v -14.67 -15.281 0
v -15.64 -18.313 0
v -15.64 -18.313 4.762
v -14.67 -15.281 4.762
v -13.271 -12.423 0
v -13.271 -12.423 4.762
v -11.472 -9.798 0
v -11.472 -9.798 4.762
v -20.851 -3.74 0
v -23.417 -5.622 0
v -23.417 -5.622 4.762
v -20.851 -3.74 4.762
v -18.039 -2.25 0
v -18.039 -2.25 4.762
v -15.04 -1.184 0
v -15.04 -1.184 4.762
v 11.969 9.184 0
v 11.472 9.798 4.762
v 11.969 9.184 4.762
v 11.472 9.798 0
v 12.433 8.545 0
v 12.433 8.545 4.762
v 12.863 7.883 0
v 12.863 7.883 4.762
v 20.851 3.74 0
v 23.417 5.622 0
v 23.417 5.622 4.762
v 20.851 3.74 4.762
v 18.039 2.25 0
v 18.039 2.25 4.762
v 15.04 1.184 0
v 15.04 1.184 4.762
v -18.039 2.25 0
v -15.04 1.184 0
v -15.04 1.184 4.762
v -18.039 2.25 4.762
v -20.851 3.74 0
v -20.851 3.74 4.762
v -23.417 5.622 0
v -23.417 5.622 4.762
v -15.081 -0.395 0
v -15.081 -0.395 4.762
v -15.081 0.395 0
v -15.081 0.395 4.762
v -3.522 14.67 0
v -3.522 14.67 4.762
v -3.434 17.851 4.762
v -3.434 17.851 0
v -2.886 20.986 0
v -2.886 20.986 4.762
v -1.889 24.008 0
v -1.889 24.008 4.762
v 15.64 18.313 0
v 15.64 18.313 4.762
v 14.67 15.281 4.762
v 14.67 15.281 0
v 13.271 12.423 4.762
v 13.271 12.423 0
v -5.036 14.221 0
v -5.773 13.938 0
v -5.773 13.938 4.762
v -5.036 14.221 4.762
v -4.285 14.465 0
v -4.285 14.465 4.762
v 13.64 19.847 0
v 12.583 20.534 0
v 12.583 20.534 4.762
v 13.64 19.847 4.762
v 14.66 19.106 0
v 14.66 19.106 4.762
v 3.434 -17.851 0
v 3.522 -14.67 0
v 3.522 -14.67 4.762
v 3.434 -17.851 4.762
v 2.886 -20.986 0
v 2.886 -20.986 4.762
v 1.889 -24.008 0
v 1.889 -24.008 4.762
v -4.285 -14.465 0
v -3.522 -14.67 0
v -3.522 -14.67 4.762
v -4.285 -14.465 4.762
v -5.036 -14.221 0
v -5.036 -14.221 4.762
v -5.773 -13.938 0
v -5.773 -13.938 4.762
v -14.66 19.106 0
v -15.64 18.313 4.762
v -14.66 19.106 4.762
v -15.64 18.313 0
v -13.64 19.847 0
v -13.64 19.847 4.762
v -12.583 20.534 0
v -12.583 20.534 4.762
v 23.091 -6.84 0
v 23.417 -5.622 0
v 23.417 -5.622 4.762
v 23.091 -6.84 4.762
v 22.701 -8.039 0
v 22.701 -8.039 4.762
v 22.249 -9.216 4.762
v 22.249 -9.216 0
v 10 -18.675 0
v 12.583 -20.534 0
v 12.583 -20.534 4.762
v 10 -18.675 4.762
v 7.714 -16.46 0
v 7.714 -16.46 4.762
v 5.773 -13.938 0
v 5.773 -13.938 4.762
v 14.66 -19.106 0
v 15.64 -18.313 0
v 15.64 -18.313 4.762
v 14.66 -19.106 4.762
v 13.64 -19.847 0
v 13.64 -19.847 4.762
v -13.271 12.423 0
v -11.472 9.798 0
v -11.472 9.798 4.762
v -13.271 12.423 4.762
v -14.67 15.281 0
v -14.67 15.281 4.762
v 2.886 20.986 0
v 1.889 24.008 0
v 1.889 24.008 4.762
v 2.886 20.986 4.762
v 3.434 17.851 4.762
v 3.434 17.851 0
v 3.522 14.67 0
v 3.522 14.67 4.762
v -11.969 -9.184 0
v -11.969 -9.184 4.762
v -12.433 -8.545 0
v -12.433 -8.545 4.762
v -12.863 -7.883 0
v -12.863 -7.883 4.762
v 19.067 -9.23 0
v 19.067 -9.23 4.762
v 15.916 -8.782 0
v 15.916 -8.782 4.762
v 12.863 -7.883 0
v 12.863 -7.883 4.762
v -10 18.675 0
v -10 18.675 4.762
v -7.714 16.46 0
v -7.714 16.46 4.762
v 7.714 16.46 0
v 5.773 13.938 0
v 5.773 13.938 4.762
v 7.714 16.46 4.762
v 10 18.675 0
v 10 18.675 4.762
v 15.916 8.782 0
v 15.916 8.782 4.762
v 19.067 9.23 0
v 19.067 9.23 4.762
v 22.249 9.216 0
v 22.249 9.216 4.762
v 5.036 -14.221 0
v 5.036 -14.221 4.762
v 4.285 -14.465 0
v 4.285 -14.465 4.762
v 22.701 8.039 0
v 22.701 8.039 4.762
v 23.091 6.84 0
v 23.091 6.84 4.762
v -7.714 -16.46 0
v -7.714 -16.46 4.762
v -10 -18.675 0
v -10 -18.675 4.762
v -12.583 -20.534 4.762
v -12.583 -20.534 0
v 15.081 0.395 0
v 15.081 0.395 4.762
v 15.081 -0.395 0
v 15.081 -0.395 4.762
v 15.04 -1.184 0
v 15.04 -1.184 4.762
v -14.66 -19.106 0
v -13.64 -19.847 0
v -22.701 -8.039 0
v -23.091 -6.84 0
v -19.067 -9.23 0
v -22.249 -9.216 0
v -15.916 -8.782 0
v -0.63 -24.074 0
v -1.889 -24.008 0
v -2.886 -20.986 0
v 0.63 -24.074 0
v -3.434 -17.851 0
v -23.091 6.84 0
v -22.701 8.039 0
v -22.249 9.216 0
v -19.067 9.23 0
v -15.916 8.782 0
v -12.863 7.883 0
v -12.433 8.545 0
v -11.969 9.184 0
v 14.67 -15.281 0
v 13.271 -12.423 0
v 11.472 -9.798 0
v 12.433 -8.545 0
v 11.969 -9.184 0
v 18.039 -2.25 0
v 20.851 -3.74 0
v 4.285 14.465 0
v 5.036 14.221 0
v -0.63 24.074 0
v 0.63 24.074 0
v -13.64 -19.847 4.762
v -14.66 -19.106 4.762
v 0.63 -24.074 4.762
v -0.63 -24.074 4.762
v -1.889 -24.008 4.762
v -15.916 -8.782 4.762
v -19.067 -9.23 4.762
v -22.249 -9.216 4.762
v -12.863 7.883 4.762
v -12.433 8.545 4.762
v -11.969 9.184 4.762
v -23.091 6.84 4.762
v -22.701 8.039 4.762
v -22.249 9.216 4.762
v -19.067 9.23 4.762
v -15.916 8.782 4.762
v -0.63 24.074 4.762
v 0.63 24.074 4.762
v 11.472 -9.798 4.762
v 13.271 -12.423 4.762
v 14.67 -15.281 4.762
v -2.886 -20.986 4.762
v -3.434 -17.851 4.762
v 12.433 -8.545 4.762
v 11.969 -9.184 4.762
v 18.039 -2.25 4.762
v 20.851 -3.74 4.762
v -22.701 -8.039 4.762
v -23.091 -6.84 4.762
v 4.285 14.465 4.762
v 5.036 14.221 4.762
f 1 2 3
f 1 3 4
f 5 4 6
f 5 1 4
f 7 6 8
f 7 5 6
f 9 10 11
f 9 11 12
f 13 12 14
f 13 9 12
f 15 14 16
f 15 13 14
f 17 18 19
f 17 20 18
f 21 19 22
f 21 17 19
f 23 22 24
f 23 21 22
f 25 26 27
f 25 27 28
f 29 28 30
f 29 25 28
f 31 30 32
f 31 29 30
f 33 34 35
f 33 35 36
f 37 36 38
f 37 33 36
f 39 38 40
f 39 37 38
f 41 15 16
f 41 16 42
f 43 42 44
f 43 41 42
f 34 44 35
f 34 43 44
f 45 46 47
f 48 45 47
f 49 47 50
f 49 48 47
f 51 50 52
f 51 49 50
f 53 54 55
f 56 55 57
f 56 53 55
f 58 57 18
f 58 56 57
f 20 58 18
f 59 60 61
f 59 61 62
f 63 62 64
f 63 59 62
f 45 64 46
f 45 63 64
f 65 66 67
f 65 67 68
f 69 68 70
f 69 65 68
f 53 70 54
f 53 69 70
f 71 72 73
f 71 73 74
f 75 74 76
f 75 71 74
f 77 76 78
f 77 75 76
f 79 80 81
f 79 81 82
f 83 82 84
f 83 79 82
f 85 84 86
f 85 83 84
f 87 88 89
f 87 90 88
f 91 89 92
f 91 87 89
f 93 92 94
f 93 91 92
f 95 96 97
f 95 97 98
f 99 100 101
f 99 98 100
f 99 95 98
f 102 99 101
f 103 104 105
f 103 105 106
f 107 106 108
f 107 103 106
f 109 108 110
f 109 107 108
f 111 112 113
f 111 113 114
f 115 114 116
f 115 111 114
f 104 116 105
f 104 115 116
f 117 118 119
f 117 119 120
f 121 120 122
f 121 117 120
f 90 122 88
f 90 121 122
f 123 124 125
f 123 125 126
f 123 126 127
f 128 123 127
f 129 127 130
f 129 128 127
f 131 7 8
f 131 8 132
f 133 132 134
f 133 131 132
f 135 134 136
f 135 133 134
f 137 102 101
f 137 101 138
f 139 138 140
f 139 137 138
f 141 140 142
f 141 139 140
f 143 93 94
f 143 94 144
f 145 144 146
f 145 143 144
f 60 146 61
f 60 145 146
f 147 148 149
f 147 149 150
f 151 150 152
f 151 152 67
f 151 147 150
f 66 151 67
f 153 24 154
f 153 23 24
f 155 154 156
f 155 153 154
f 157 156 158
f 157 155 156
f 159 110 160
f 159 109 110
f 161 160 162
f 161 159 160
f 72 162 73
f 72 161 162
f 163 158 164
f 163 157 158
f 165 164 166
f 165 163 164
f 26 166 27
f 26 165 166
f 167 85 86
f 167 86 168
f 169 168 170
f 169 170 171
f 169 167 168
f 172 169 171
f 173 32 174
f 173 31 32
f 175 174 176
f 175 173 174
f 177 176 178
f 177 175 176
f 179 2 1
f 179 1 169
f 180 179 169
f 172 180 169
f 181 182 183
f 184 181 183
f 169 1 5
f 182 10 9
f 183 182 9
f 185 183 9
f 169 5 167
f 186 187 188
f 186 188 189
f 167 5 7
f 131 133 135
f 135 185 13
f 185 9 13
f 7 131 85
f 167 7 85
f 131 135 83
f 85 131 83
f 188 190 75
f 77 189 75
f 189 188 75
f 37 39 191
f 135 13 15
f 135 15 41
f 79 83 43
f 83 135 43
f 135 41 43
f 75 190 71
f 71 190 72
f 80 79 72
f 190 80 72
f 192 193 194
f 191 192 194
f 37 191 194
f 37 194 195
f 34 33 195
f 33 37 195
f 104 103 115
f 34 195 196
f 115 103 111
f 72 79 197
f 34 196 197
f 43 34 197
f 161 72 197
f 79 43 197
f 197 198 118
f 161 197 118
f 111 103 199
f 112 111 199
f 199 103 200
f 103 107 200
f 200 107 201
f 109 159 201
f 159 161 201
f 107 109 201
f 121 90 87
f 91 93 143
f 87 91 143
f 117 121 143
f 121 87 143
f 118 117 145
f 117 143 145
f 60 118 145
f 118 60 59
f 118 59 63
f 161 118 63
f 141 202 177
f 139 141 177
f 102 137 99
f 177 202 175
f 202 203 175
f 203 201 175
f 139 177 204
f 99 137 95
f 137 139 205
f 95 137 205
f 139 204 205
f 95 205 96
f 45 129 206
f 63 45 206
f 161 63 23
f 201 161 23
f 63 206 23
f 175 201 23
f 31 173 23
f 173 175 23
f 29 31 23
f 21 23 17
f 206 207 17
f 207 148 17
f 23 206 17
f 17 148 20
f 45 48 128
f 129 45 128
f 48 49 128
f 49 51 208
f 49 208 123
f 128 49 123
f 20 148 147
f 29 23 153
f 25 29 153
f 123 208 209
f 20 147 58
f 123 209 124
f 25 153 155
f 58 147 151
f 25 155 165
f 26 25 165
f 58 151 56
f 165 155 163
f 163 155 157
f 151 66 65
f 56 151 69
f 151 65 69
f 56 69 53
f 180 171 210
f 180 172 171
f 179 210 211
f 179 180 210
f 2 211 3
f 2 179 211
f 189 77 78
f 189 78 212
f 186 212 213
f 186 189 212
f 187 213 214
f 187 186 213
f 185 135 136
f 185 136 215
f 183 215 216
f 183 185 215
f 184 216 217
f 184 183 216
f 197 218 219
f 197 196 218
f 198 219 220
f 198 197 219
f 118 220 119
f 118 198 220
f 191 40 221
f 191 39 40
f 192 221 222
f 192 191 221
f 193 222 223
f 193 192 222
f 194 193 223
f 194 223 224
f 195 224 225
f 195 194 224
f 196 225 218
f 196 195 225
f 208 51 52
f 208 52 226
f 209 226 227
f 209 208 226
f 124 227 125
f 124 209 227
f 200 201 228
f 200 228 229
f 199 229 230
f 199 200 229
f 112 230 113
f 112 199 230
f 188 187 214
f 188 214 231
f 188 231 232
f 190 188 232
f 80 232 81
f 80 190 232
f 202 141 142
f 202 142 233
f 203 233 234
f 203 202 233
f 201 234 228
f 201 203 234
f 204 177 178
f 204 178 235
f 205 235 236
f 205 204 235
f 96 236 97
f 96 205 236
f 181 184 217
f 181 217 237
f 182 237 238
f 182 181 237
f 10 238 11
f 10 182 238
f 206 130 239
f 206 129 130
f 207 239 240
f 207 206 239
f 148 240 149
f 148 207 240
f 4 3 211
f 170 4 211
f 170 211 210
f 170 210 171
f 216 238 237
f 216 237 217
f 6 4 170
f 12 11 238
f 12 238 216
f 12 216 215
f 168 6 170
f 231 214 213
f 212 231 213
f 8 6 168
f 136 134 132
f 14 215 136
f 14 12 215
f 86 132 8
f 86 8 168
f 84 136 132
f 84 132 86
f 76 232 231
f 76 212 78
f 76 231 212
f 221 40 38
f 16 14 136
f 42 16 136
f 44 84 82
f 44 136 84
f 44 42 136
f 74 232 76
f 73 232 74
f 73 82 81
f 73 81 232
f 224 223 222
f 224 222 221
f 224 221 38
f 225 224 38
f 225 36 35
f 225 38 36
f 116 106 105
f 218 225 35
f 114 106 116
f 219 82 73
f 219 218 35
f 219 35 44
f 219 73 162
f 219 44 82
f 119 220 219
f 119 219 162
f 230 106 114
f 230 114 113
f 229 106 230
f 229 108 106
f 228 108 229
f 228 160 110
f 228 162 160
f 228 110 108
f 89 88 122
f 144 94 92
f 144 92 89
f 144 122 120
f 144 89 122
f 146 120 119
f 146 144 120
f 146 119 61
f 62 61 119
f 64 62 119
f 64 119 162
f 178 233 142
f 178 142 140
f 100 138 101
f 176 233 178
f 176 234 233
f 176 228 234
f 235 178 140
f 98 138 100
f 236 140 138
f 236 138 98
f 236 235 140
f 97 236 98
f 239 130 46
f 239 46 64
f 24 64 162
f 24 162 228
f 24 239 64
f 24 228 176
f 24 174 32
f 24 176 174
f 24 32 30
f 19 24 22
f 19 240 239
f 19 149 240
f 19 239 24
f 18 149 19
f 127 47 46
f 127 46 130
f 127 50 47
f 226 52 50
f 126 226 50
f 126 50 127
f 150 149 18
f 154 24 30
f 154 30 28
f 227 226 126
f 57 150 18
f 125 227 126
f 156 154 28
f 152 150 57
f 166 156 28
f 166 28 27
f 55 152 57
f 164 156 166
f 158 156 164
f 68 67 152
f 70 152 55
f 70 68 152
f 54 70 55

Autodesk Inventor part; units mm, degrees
sketch "Sketch1" plane through (0, 0, 0) normal (0, 0, 1) x (1, 0, 0)
  circle A0 centre (0, 0) radius 24.0825
  dimension "d0" = 48.1651
extrude "Extrusion1" add sketch "Sketch1" along normal blind 4.7625
sketch "Sketch2" plane through (0, 0, 0) normal (0, 0, -1) x (-1, 0, 0)
  circle A0 centre (0, 0) radius 24.0825 projected
  circle A1 centre (0, 0) radius 20
  dimension "d3" = 40
surface extrude "Pitch Diameter" sketch "Sketch2" against normal through all shown no curves A1
ref_plane "Work Plane1" through (0, 0, 0) normal (1, 0, 0) x (0, 1, 0)
ref_plane "Work Plane2" through (0, 0, 0) normal (0.9510565, 0.309017, 0) x (0, 0, 1)
ref_plane "Work Plane3" through (0, 0, 2.3813) normal (0, 0, -1) x (-1, 0, 0)
spur gear teeth "Spur Gear" teeth 10 pitch diameter 40 tip diameter 48.1651 root diameter 30.1732 face width 4.7625 start plane through (0, 0, 0) normal (0, 0, -1) x (-1, 0, 0)
equation "\"d0\" = da_da"
equation "\"d1\" = da_b"
equation "\"d3\" = da_d"
equation "\"d15\" = da_aw"
equation "\"d19\" = da_aw"
equation "\"da_da\" = 48.165053"
equation "\"da_b\" = 4.7625"
equation "\"da_d\" = 40"
equation "\"da_aw\" = 60.255685"
properties part number "DRIVEN,INTAKE" material "Steel"
